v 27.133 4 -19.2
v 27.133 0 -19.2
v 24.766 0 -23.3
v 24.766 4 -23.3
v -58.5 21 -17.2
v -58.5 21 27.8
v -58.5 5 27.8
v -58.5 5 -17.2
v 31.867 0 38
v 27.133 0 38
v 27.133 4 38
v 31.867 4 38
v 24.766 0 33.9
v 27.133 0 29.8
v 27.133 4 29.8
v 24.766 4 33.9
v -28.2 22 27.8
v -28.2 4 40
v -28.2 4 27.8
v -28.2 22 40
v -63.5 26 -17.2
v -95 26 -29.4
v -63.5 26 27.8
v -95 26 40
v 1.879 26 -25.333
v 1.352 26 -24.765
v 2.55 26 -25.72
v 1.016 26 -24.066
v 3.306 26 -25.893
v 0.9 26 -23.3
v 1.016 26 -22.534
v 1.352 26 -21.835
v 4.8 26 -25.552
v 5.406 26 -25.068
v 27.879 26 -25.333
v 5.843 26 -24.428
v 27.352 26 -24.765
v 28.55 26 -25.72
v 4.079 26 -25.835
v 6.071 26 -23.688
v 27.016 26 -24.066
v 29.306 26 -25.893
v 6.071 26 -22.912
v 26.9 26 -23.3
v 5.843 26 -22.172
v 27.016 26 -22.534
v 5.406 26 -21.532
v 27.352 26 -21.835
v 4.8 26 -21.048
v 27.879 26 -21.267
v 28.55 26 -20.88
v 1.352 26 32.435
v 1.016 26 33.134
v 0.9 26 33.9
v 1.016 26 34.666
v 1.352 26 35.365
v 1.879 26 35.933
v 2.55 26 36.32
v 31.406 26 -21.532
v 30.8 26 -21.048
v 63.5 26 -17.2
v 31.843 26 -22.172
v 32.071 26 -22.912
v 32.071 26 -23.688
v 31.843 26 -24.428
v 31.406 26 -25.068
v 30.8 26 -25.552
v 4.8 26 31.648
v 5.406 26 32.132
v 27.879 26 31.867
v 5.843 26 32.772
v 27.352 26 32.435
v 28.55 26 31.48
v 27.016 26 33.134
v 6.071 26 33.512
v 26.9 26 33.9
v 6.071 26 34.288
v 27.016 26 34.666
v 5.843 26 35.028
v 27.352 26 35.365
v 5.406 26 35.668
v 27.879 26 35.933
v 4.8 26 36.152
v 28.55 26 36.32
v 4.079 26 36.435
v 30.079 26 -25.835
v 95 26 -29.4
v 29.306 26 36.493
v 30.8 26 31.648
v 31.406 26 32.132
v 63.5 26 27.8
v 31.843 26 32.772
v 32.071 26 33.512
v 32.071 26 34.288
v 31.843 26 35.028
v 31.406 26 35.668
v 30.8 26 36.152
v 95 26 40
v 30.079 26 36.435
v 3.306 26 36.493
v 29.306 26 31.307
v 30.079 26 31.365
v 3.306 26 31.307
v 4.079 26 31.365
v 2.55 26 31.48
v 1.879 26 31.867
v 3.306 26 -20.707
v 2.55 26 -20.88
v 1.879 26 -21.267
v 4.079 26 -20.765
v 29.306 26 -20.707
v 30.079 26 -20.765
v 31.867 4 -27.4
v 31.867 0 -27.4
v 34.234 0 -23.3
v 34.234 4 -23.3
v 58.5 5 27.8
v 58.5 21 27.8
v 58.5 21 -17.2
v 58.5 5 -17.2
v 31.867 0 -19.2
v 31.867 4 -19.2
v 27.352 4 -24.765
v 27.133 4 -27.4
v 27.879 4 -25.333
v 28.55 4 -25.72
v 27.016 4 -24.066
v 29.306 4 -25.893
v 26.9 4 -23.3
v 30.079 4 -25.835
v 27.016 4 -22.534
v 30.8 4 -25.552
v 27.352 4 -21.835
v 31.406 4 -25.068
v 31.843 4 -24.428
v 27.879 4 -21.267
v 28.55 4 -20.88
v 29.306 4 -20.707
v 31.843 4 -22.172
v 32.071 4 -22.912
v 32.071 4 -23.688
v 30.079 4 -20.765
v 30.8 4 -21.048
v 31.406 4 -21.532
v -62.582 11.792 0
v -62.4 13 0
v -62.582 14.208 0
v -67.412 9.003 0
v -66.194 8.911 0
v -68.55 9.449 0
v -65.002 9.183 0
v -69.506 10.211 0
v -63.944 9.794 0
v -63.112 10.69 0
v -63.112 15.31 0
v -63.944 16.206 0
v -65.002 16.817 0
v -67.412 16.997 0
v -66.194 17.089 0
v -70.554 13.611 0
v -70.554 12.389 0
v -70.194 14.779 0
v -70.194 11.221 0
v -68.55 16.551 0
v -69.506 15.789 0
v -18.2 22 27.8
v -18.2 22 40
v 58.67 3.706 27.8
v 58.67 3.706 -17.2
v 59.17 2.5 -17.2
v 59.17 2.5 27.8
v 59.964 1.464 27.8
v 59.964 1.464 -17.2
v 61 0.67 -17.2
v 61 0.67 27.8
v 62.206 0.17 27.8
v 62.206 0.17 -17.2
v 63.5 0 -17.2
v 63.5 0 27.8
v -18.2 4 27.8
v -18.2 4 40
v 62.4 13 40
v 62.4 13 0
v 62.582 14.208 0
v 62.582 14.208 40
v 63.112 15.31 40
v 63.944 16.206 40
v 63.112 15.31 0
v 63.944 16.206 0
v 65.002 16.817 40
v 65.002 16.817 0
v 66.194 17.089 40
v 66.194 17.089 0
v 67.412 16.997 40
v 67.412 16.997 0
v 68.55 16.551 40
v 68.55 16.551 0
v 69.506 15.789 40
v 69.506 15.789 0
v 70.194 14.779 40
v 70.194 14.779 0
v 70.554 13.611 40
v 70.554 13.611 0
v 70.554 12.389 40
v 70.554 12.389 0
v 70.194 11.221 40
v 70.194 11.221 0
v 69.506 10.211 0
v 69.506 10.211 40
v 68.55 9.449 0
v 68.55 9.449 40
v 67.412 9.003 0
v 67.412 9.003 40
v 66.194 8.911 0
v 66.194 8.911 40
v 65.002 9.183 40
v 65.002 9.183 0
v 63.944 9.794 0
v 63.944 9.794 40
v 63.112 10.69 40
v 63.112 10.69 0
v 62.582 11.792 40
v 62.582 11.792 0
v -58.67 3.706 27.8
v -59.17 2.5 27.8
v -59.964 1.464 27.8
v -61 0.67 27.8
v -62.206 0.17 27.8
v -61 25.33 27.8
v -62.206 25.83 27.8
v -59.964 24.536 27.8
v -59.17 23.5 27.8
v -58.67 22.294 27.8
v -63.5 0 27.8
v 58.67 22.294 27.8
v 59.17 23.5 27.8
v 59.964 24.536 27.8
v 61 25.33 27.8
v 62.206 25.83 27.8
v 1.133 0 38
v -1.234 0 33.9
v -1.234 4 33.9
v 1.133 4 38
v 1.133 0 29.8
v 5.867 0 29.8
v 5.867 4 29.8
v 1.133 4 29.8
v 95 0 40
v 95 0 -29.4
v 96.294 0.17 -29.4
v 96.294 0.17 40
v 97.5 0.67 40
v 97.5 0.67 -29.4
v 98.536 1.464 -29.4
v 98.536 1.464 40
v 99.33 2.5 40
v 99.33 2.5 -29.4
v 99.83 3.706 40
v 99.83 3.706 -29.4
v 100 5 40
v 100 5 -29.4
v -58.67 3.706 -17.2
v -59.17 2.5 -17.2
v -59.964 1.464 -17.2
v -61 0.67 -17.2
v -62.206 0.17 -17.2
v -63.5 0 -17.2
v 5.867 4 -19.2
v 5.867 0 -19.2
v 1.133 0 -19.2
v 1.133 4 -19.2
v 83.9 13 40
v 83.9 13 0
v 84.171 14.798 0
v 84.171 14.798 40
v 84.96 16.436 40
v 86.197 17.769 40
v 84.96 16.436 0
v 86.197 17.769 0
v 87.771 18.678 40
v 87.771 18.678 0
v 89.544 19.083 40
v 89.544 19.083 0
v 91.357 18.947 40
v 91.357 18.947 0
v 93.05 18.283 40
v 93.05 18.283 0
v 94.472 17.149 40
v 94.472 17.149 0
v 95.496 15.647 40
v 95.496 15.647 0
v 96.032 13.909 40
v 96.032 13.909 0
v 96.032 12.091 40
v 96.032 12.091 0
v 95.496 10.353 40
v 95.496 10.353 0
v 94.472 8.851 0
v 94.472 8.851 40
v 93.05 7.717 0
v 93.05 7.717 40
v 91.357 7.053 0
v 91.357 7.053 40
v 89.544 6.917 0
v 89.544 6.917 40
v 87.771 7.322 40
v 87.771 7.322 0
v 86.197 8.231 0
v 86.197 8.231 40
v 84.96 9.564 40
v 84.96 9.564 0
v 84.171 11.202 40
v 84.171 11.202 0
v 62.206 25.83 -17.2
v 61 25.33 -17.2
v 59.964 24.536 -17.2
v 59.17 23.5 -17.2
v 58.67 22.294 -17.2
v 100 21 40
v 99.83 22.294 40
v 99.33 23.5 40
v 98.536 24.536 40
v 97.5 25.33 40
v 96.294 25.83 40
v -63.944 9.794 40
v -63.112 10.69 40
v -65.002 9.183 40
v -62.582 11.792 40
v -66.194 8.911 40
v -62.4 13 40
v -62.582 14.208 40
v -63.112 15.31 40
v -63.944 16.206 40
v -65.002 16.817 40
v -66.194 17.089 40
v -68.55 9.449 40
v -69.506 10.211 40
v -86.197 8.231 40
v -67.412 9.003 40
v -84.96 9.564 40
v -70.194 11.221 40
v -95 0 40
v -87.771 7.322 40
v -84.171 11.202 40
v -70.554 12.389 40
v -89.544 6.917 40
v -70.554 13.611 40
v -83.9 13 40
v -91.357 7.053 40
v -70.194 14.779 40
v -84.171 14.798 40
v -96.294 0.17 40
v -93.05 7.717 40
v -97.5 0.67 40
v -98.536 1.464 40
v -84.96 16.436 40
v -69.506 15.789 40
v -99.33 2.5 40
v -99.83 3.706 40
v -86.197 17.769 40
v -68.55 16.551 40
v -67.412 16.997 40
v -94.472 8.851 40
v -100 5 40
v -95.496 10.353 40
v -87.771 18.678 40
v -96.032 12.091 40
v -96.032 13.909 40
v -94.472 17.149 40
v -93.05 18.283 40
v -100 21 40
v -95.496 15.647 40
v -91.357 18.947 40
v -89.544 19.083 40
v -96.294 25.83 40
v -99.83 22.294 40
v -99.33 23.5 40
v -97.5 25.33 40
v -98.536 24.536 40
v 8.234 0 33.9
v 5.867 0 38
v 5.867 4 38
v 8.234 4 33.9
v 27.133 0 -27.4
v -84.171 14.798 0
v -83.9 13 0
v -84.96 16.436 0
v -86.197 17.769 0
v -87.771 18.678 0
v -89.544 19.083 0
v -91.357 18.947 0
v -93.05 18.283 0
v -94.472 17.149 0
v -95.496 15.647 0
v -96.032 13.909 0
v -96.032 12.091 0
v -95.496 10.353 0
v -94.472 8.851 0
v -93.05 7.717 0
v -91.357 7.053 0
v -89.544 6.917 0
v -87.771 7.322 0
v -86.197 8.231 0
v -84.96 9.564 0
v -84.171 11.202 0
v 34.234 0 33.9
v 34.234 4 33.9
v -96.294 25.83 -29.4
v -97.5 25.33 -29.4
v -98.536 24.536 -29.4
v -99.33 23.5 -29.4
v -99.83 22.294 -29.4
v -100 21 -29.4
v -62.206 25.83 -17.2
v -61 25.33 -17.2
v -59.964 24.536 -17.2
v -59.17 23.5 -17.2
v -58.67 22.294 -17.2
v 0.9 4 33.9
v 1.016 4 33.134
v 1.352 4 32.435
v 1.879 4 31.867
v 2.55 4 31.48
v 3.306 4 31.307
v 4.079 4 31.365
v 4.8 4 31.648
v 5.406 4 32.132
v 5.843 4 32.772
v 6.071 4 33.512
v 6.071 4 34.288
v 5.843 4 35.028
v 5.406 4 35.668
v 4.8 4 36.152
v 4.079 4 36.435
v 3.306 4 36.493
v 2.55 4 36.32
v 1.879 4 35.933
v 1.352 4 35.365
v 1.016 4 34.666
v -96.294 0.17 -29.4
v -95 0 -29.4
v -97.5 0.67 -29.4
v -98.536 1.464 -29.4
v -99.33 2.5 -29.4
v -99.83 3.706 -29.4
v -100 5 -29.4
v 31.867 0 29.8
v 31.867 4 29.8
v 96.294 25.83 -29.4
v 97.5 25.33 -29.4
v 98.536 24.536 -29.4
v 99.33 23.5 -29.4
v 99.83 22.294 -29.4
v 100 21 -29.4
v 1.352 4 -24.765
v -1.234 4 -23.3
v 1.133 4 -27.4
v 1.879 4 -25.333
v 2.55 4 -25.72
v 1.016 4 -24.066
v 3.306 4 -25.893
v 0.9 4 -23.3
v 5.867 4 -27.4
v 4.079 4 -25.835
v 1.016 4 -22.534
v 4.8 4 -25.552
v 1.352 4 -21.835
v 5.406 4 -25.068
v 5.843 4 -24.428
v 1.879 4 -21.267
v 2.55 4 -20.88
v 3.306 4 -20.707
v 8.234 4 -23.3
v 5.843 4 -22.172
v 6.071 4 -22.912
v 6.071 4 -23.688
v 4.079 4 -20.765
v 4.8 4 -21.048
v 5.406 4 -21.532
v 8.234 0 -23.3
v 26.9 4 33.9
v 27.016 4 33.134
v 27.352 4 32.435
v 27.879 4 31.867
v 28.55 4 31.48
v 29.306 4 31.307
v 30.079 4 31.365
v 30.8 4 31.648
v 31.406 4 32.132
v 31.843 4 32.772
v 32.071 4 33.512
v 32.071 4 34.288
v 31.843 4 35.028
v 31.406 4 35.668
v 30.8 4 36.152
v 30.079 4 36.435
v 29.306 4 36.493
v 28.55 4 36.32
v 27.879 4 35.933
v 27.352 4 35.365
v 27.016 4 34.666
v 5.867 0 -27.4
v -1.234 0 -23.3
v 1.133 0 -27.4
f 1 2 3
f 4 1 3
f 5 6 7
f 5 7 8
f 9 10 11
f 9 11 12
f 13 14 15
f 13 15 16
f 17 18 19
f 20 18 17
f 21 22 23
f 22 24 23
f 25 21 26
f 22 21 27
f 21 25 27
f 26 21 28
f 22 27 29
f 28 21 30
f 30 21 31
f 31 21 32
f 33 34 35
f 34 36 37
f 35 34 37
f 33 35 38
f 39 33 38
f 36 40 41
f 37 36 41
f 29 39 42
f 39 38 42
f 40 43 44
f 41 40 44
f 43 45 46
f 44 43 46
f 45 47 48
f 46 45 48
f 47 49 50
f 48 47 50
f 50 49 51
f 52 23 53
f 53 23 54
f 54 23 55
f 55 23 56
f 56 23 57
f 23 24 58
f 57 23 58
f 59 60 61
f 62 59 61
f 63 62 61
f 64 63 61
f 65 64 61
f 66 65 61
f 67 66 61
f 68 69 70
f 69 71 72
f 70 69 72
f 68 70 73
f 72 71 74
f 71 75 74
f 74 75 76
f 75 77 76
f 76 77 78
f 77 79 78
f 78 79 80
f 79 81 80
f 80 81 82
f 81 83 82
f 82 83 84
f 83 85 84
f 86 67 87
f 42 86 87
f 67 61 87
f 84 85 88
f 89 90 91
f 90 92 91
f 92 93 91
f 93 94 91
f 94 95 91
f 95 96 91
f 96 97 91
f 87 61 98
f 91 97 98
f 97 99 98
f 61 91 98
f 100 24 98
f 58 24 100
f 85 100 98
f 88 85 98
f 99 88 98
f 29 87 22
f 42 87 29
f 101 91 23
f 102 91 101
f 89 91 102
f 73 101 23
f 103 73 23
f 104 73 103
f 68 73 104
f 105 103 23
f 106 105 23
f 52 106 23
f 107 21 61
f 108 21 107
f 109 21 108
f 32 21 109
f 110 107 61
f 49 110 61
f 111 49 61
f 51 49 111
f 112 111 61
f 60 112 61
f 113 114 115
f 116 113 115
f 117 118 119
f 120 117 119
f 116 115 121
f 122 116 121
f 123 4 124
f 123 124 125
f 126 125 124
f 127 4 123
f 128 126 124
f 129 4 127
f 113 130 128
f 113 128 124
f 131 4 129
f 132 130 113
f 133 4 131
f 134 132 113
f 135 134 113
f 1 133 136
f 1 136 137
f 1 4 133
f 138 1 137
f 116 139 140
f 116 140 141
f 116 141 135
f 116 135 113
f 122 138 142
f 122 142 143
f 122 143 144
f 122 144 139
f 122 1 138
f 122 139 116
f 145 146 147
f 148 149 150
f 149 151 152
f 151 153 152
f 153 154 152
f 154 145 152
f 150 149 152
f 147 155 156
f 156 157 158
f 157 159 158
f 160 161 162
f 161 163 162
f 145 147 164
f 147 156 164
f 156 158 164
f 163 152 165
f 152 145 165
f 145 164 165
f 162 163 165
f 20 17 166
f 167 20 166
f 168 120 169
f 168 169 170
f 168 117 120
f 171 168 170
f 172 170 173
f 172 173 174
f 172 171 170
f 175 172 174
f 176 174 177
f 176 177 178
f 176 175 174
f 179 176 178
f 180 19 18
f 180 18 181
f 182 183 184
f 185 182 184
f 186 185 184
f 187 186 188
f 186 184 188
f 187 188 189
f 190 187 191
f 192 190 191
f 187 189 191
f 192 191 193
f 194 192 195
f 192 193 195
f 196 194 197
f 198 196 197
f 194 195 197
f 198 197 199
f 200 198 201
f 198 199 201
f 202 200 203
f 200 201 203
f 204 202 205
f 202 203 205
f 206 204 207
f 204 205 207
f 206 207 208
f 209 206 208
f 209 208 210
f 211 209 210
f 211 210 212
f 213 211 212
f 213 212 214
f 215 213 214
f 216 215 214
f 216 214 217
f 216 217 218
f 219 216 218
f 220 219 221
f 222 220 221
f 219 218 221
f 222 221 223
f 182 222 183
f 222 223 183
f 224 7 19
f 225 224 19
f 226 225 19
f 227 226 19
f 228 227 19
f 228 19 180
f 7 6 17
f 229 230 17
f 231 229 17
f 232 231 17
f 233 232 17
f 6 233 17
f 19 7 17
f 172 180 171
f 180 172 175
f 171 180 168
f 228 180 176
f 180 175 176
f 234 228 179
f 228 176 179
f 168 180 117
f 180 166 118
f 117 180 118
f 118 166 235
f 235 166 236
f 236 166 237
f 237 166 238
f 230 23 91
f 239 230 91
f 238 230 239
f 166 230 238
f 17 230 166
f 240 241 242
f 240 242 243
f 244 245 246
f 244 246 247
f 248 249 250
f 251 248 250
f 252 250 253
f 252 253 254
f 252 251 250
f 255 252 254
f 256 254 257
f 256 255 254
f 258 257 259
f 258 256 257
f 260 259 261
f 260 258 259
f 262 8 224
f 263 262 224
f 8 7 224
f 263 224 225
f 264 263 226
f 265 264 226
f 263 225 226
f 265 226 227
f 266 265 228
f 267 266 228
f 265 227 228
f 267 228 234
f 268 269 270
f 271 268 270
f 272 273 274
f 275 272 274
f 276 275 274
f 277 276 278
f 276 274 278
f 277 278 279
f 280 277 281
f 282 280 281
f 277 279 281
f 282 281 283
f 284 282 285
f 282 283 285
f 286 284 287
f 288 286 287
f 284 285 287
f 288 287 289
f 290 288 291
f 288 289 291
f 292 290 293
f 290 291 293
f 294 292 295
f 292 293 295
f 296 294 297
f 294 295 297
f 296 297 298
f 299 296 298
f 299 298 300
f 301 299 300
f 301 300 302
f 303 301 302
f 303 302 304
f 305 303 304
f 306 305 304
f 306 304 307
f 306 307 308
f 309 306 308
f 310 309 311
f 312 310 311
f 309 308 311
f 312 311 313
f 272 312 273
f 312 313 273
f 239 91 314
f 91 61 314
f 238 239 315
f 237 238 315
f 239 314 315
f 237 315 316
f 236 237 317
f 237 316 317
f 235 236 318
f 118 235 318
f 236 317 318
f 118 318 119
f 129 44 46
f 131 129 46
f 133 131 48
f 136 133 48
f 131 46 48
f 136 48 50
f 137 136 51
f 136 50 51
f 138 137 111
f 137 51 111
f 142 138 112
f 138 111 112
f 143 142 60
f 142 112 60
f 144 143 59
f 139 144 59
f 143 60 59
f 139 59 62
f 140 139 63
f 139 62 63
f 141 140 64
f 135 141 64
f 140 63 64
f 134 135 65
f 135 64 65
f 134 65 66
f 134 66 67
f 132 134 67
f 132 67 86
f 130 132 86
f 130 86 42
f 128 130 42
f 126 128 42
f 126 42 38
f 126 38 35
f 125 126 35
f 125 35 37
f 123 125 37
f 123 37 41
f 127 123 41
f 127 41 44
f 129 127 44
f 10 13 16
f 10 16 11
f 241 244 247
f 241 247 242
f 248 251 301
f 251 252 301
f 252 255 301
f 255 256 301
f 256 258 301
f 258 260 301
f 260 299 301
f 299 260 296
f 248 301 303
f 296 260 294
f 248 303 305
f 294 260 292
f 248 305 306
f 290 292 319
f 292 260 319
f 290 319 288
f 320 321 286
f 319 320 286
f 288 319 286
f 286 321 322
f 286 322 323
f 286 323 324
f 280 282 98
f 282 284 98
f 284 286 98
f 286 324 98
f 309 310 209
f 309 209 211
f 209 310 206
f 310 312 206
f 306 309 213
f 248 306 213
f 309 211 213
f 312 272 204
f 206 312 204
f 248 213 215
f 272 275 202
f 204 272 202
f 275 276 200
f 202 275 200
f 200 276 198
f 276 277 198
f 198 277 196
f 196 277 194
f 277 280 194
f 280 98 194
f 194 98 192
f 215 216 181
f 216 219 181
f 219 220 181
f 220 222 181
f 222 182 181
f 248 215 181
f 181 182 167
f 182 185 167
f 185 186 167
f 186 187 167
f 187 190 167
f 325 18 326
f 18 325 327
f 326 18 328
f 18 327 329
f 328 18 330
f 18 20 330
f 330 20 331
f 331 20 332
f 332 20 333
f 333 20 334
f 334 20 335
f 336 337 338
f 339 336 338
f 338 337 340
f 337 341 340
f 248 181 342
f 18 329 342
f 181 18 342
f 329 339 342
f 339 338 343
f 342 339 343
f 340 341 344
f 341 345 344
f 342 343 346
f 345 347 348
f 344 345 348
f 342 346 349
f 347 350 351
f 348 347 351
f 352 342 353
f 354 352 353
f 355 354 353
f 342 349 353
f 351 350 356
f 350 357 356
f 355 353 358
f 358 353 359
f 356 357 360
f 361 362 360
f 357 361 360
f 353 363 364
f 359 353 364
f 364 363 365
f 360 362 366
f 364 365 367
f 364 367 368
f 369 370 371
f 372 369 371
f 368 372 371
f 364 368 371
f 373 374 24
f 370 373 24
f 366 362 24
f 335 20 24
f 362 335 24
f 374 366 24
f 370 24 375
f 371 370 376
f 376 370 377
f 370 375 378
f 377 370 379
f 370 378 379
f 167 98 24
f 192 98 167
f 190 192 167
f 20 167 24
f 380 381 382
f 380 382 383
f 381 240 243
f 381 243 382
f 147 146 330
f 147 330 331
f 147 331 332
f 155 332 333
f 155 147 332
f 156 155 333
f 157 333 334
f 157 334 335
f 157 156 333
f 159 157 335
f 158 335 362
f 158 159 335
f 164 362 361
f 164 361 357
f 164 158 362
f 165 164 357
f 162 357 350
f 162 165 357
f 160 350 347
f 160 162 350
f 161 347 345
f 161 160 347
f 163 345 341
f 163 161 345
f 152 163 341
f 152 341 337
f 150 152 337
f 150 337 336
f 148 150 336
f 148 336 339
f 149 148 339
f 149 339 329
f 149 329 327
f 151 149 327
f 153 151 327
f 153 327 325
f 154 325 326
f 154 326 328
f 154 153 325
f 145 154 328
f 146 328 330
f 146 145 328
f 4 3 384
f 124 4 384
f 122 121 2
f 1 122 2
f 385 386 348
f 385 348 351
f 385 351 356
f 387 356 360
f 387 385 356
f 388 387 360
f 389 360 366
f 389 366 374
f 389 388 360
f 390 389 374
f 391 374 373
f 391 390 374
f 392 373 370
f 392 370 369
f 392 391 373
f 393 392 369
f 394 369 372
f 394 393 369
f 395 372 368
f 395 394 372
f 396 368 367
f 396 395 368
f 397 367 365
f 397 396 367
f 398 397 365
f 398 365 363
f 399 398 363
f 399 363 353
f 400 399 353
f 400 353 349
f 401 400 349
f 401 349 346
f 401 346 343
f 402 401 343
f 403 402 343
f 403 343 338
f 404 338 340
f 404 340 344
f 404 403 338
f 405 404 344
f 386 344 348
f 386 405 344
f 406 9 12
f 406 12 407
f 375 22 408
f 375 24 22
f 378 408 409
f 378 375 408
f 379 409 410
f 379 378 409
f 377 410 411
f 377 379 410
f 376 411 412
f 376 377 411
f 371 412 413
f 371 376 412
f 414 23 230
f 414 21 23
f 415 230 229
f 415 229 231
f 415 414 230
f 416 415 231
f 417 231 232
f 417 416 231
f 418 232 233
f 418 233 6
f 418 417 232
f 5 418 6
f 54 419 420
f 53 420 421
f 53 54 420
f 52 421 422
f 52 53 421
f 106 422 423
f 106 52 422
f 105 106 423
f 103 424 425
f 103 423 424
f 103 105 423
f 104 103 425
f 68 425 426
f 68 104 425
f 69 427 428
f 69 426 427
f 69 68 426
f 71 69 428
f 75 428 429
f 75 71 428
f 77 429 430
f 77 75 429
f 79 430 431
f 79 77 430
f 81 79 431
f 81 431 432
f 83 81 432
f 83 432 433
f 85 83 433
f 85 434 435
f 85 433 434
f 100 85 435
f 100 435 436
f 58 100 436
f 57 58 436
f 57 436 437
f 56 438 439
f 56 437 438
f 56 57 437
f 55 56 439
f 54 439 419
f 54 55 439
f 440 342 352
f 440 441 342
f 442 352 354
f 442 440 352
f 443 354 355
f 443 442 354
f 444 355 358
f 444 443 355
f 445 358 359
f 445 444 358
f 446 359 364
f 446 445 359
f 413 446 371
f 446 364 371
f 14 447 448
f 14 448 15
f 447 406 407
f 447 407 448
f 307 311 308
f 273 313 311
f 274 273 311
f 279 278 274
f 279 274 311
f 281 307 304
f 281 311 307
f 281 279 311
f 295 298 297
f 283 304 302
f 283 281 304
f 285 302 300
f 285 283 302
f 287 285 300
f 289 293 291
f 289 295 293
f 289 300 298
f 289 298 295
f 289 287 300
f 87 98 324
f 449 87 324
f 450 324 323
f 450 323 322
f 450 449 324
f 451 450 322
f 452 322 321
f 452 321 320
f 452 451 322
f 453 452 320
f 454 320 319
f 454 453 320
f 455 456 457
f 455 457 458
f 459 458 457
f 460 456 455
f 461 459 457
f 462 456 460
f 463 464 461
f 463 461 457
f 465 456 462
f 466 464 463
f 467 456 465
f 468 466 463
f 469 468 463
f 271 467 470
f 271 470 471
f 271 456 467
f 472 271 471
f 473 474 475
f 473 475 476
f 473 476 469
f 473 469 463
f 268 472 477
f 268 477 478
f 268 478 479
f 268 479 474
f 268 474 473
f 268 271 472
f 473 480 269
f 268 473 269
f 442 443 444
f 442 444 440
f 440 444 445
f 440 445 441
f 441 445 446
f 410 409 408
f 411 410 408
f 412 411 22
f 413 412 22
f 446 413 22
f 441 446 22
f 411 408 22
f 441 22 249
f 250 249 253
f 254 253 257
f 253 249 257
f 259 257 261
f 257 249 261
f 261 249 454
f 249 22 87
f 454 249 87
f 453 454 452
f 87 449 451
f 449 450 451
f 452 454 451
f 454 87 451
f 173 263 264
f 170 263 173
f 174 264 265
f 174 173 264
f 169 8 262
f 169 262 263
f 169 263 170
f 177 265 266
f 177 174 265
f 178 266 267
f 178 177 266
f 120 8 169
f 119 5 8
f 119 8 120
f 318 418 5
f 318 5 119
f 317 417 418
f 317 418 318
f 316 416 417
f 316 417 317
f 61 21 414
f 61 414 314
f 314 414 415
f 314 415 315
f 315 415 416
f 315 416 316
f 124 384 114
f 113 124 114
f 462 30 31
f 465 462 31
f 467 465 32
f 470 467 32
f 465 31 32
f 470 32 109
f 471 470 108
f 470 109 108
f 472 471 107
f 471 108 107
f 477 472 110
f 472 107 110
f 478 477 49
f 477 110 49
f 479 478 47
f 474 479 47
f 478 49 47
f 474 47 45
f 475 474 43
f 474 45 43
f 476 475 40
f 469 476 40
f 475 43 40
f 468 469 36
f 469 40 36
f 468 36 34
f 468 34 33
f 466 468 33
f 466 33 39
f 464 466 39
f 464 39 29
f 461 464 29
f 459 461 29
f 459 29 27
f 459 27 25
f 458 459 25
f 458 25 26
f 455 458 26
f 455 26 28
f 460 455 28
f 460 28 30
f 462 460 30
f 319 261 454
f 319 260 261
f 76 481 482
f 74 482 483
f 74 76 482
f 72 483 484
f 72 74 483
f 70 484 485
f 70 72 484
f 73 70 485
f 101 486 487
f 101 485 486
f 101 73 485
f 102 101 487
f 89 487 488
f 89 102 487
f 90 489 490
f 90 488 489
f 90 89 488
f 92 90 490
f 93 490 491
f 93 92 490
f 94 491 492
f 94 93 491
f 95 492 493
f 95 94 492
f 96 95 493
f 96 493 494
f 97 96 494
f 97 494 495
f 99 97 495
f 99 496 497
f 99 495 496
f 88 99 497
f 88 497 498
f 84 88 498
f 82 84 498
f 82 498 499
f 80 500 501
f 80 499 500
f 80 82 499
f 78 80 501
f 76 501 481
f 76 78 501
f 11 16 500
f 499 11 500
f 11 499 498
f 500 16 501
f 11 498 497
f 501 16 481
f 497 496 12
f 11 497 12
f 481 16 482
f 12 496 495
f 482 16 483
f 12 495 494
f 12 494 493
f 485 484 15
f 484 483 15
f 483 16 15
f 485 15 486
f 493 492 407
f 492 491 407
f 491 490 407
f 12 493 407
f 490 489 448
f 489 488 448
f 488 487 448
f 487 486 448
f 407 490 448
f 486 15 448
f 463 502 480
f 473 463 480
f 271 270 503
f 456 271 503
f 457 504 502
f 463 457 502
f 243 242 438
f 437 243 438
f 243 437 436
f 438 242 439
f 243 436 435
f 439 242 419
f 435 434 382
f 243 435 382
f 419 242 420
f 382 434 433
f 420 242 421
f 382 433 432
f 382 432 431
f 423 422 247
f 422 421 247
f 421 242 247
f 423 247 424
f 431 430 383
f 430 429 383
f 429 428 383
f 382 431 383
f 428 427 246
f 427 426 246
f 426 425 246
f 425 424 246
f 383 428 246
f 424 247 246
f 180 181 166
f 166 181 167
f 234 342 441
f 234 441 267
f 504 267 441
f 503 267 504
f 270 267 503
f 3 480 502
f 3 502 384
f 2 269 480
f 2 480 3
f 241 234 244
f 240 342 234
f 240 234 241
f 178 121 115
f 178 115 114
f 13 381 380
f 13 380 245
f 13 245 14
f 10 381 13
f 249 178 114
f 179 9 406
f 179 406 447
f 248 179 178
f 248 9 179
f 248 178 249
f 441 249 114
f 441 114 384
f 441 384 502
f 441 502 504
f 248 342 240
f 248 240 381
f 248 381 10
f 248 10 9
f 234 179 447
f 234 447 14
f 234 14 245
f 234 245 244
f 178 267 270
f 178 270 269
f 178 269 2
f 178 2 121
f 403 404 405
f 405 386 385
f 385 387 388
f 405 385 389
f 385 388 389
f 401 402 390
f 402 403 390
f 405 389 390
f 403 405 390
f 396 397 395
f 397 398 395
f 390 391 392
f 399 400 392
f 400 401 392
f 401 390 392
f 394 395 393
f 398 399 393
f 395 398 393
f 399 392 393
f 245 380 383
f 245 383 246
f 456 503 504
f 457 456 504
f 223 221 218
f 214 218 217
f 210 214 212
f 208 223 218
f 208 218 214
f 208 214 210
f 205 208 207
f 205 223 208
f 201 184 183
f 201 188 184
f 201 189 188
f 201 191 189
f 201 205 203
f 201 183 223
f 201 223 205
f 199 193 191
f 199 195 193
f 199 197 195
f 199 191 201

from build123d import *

# Parameters (mm, degrees)
SKETCH1_W           = 100
SKETCH1_H           = 26
SKETCH1_R           = 6.1
SKETCH1_R_2         = 4.1
BOSS_EXTRUDE1_DEPTH = 40
SKETCH2_W           = 100
SKETCH2_H           = 26
BOSS_EXTRUDE2_DEPTH = 29.4
CUT_EXTRUDE1_REACH  = 112.797
SKETCH3_W           = 58.5
SKETCH3_H           = 45
SKETCH4_R           = 2.6
CUT_EXTRUDE2_DEPTH  = 111.797111876
CUT_EXTRUDE3_DEPTH  = 4
SKETCH6_W           = 10
SKETCH6_H           = 18
CUT_EXTRUDE4_DEPTH  = 12.2
FILLET1_R           = 5


with BuildPart() as part:
    # Sketch1 → Boss-Extrude1 (new body)
    with BuildSketch(Plane.XY):
        with Locations((-50, 13)):
            Rectangle(SKETCH1_W, SKETCH1_H)
        with Locations((-90, 13)):
            Circle(SKETCH1_R, mode=Mode.SUBTRACT)
        with Locations((-66.5, 13)):
            Circle(SKETCH1_R_2, mode=Mode.SUBTRACT)
    boss_extrude1 = extrude(amount=BOSS_EXTRUDE1_DEPTH)

    # Sketch2 → Boss-Extrude2 (add)
    with BuildSketch(Plane(origin=(0, 0, 0), x_dir=(-1, 0, 0), z_dir=(0, 0, -1))):
        with Locations((50, 13)):
            Rectangle(SKETCH2_W, SKETCH2_H)
    boss_extrude2 = extrude(amount=BOSS_EXTRUDE2_DEPTH)

    # Sketch3 → Cut-Extrude1 (cut, up to next)
    with BuildSketch(Plane(origin=(0, 26, 0), x_dir=(1, 0, 0), z_dir=(0, 1, 0)), mode=Mode.PRIVATE) as cut_extrude1_sk1:
        with Locations((-29.25, -5.3)):
            Rectangle(SKETCH3_W, SKETCH3_H)
    cut_extrude1_tool1 = extrude(cut_extrude1_sk1.sketch, amount=-CUT_EXTRUDE1_REACH, mode=Mode.PRIVATE) & part.part
    cut_extrude1 = cut_extrude1_tool1.solids().sort_by_distance((-29.25, 26, 5.3))[0]
    add(cut_extrude1, mode=Mode.SUBTRACT)

    # Mirror2: Boss-Extrude1, Boss-Extrude2, Cut-Extrude1 across plane
    add(boss_extrude1.mirror(Plane(origin=(0, 0, 40), x_dir=(0, 0, 1), z_dir=(-1, 0, 0))))
    add(boss_extrude2.mirror(Plane(origin=(0, 0, 40), x_dir=(0, 0, 1), z_dir=(-1, 0, 0))))
    add(cut_extrude1.mirror(Plane(origin=(0, 0, 40), x_dir=(0, 0, 1), z_dir=(-1, 0, 0))), mode=Mode.SUBTRACT)

    # Sketch4 → Cut-Extrude2 (cut, through all)
    with BuildSketch(Plane(origin=(0, 26, 0), x_dir=(1, 0, 0), z_dir=(0, 1, 0))):
        with Locations(Location((3.5, 23.3, 0), (0, 0, 180))):
            Circle(SKETCH4_R)
        with Locations(Location((29.5, 23.3, 0), (0, 0, 180))):
            Circle(SKETCH4_R)
    cut_extrude2 = extrude(amount=-CUT_EXTRUDE2_DEPTH, mode=Mode.SUBTRACT)

    # Sketch5 → Cut-Extrude3 (cut)
    with BuildSketch(Plane.XZ):
        Polygon((34.234272207, -23.3), (31.867136104, -19.2), (27.132863896, -19.2), (24.765727793, -23.3), (27.132863896, -27.4), (31.867136104, -27.4), align=None)
        Polygon((-1.234272207, -23.3), (1.132863896, -27.4), (5.867136104, -27.4), (8.234272207, -23.3), (5.867136104, -19.2), (1.132863896, -19.2), align=None)
    cut_extrude3 = extrude(amount=-CUT_EXTRUDE3_DEPTH, mode=Mode.SUBTRACT)

    # Mirror3: Cut-Extrude2, Cut-Extrude3 across plane
    add(cut_extrude2.mirror(Plane.XY.offset(5.3)), mode=Mode.SUBTRACT)
    add(cut_extrude3.mirror(Plane.XY.offset(5.3)), mode=Mode.SUBTRACT)

    # Sketch6 → Cut-Extrude4 (cut)
    with BuildSketch(Plane.XY.offset(40)):
        with Locations((-23.2, 13)):
            Rectangle(SKETCH6_W, SKETCH6_H)
    extrude(amount=-CUT_EXTRUDE4_DEPTH, mode=Mode.SUBTRACT)

    # Fillet1
    fillet1_edges = [part.edges().sort_by_distance(p)[0] for p in [
        (-58.5, 26, 5.3),
        (-58.5, 0, 5.3),
        (100, 0, 5.3),
        (100, 26, 5.3),
        (-100, 0, 5.3),
        (-100, 26, 5.3),
        (58.5, 0, 5.3),
        (58.5, 26, 5.3),
    ]]
    fillet(fillet1_edges, radius=FILLET1_R)


solid = part.part
